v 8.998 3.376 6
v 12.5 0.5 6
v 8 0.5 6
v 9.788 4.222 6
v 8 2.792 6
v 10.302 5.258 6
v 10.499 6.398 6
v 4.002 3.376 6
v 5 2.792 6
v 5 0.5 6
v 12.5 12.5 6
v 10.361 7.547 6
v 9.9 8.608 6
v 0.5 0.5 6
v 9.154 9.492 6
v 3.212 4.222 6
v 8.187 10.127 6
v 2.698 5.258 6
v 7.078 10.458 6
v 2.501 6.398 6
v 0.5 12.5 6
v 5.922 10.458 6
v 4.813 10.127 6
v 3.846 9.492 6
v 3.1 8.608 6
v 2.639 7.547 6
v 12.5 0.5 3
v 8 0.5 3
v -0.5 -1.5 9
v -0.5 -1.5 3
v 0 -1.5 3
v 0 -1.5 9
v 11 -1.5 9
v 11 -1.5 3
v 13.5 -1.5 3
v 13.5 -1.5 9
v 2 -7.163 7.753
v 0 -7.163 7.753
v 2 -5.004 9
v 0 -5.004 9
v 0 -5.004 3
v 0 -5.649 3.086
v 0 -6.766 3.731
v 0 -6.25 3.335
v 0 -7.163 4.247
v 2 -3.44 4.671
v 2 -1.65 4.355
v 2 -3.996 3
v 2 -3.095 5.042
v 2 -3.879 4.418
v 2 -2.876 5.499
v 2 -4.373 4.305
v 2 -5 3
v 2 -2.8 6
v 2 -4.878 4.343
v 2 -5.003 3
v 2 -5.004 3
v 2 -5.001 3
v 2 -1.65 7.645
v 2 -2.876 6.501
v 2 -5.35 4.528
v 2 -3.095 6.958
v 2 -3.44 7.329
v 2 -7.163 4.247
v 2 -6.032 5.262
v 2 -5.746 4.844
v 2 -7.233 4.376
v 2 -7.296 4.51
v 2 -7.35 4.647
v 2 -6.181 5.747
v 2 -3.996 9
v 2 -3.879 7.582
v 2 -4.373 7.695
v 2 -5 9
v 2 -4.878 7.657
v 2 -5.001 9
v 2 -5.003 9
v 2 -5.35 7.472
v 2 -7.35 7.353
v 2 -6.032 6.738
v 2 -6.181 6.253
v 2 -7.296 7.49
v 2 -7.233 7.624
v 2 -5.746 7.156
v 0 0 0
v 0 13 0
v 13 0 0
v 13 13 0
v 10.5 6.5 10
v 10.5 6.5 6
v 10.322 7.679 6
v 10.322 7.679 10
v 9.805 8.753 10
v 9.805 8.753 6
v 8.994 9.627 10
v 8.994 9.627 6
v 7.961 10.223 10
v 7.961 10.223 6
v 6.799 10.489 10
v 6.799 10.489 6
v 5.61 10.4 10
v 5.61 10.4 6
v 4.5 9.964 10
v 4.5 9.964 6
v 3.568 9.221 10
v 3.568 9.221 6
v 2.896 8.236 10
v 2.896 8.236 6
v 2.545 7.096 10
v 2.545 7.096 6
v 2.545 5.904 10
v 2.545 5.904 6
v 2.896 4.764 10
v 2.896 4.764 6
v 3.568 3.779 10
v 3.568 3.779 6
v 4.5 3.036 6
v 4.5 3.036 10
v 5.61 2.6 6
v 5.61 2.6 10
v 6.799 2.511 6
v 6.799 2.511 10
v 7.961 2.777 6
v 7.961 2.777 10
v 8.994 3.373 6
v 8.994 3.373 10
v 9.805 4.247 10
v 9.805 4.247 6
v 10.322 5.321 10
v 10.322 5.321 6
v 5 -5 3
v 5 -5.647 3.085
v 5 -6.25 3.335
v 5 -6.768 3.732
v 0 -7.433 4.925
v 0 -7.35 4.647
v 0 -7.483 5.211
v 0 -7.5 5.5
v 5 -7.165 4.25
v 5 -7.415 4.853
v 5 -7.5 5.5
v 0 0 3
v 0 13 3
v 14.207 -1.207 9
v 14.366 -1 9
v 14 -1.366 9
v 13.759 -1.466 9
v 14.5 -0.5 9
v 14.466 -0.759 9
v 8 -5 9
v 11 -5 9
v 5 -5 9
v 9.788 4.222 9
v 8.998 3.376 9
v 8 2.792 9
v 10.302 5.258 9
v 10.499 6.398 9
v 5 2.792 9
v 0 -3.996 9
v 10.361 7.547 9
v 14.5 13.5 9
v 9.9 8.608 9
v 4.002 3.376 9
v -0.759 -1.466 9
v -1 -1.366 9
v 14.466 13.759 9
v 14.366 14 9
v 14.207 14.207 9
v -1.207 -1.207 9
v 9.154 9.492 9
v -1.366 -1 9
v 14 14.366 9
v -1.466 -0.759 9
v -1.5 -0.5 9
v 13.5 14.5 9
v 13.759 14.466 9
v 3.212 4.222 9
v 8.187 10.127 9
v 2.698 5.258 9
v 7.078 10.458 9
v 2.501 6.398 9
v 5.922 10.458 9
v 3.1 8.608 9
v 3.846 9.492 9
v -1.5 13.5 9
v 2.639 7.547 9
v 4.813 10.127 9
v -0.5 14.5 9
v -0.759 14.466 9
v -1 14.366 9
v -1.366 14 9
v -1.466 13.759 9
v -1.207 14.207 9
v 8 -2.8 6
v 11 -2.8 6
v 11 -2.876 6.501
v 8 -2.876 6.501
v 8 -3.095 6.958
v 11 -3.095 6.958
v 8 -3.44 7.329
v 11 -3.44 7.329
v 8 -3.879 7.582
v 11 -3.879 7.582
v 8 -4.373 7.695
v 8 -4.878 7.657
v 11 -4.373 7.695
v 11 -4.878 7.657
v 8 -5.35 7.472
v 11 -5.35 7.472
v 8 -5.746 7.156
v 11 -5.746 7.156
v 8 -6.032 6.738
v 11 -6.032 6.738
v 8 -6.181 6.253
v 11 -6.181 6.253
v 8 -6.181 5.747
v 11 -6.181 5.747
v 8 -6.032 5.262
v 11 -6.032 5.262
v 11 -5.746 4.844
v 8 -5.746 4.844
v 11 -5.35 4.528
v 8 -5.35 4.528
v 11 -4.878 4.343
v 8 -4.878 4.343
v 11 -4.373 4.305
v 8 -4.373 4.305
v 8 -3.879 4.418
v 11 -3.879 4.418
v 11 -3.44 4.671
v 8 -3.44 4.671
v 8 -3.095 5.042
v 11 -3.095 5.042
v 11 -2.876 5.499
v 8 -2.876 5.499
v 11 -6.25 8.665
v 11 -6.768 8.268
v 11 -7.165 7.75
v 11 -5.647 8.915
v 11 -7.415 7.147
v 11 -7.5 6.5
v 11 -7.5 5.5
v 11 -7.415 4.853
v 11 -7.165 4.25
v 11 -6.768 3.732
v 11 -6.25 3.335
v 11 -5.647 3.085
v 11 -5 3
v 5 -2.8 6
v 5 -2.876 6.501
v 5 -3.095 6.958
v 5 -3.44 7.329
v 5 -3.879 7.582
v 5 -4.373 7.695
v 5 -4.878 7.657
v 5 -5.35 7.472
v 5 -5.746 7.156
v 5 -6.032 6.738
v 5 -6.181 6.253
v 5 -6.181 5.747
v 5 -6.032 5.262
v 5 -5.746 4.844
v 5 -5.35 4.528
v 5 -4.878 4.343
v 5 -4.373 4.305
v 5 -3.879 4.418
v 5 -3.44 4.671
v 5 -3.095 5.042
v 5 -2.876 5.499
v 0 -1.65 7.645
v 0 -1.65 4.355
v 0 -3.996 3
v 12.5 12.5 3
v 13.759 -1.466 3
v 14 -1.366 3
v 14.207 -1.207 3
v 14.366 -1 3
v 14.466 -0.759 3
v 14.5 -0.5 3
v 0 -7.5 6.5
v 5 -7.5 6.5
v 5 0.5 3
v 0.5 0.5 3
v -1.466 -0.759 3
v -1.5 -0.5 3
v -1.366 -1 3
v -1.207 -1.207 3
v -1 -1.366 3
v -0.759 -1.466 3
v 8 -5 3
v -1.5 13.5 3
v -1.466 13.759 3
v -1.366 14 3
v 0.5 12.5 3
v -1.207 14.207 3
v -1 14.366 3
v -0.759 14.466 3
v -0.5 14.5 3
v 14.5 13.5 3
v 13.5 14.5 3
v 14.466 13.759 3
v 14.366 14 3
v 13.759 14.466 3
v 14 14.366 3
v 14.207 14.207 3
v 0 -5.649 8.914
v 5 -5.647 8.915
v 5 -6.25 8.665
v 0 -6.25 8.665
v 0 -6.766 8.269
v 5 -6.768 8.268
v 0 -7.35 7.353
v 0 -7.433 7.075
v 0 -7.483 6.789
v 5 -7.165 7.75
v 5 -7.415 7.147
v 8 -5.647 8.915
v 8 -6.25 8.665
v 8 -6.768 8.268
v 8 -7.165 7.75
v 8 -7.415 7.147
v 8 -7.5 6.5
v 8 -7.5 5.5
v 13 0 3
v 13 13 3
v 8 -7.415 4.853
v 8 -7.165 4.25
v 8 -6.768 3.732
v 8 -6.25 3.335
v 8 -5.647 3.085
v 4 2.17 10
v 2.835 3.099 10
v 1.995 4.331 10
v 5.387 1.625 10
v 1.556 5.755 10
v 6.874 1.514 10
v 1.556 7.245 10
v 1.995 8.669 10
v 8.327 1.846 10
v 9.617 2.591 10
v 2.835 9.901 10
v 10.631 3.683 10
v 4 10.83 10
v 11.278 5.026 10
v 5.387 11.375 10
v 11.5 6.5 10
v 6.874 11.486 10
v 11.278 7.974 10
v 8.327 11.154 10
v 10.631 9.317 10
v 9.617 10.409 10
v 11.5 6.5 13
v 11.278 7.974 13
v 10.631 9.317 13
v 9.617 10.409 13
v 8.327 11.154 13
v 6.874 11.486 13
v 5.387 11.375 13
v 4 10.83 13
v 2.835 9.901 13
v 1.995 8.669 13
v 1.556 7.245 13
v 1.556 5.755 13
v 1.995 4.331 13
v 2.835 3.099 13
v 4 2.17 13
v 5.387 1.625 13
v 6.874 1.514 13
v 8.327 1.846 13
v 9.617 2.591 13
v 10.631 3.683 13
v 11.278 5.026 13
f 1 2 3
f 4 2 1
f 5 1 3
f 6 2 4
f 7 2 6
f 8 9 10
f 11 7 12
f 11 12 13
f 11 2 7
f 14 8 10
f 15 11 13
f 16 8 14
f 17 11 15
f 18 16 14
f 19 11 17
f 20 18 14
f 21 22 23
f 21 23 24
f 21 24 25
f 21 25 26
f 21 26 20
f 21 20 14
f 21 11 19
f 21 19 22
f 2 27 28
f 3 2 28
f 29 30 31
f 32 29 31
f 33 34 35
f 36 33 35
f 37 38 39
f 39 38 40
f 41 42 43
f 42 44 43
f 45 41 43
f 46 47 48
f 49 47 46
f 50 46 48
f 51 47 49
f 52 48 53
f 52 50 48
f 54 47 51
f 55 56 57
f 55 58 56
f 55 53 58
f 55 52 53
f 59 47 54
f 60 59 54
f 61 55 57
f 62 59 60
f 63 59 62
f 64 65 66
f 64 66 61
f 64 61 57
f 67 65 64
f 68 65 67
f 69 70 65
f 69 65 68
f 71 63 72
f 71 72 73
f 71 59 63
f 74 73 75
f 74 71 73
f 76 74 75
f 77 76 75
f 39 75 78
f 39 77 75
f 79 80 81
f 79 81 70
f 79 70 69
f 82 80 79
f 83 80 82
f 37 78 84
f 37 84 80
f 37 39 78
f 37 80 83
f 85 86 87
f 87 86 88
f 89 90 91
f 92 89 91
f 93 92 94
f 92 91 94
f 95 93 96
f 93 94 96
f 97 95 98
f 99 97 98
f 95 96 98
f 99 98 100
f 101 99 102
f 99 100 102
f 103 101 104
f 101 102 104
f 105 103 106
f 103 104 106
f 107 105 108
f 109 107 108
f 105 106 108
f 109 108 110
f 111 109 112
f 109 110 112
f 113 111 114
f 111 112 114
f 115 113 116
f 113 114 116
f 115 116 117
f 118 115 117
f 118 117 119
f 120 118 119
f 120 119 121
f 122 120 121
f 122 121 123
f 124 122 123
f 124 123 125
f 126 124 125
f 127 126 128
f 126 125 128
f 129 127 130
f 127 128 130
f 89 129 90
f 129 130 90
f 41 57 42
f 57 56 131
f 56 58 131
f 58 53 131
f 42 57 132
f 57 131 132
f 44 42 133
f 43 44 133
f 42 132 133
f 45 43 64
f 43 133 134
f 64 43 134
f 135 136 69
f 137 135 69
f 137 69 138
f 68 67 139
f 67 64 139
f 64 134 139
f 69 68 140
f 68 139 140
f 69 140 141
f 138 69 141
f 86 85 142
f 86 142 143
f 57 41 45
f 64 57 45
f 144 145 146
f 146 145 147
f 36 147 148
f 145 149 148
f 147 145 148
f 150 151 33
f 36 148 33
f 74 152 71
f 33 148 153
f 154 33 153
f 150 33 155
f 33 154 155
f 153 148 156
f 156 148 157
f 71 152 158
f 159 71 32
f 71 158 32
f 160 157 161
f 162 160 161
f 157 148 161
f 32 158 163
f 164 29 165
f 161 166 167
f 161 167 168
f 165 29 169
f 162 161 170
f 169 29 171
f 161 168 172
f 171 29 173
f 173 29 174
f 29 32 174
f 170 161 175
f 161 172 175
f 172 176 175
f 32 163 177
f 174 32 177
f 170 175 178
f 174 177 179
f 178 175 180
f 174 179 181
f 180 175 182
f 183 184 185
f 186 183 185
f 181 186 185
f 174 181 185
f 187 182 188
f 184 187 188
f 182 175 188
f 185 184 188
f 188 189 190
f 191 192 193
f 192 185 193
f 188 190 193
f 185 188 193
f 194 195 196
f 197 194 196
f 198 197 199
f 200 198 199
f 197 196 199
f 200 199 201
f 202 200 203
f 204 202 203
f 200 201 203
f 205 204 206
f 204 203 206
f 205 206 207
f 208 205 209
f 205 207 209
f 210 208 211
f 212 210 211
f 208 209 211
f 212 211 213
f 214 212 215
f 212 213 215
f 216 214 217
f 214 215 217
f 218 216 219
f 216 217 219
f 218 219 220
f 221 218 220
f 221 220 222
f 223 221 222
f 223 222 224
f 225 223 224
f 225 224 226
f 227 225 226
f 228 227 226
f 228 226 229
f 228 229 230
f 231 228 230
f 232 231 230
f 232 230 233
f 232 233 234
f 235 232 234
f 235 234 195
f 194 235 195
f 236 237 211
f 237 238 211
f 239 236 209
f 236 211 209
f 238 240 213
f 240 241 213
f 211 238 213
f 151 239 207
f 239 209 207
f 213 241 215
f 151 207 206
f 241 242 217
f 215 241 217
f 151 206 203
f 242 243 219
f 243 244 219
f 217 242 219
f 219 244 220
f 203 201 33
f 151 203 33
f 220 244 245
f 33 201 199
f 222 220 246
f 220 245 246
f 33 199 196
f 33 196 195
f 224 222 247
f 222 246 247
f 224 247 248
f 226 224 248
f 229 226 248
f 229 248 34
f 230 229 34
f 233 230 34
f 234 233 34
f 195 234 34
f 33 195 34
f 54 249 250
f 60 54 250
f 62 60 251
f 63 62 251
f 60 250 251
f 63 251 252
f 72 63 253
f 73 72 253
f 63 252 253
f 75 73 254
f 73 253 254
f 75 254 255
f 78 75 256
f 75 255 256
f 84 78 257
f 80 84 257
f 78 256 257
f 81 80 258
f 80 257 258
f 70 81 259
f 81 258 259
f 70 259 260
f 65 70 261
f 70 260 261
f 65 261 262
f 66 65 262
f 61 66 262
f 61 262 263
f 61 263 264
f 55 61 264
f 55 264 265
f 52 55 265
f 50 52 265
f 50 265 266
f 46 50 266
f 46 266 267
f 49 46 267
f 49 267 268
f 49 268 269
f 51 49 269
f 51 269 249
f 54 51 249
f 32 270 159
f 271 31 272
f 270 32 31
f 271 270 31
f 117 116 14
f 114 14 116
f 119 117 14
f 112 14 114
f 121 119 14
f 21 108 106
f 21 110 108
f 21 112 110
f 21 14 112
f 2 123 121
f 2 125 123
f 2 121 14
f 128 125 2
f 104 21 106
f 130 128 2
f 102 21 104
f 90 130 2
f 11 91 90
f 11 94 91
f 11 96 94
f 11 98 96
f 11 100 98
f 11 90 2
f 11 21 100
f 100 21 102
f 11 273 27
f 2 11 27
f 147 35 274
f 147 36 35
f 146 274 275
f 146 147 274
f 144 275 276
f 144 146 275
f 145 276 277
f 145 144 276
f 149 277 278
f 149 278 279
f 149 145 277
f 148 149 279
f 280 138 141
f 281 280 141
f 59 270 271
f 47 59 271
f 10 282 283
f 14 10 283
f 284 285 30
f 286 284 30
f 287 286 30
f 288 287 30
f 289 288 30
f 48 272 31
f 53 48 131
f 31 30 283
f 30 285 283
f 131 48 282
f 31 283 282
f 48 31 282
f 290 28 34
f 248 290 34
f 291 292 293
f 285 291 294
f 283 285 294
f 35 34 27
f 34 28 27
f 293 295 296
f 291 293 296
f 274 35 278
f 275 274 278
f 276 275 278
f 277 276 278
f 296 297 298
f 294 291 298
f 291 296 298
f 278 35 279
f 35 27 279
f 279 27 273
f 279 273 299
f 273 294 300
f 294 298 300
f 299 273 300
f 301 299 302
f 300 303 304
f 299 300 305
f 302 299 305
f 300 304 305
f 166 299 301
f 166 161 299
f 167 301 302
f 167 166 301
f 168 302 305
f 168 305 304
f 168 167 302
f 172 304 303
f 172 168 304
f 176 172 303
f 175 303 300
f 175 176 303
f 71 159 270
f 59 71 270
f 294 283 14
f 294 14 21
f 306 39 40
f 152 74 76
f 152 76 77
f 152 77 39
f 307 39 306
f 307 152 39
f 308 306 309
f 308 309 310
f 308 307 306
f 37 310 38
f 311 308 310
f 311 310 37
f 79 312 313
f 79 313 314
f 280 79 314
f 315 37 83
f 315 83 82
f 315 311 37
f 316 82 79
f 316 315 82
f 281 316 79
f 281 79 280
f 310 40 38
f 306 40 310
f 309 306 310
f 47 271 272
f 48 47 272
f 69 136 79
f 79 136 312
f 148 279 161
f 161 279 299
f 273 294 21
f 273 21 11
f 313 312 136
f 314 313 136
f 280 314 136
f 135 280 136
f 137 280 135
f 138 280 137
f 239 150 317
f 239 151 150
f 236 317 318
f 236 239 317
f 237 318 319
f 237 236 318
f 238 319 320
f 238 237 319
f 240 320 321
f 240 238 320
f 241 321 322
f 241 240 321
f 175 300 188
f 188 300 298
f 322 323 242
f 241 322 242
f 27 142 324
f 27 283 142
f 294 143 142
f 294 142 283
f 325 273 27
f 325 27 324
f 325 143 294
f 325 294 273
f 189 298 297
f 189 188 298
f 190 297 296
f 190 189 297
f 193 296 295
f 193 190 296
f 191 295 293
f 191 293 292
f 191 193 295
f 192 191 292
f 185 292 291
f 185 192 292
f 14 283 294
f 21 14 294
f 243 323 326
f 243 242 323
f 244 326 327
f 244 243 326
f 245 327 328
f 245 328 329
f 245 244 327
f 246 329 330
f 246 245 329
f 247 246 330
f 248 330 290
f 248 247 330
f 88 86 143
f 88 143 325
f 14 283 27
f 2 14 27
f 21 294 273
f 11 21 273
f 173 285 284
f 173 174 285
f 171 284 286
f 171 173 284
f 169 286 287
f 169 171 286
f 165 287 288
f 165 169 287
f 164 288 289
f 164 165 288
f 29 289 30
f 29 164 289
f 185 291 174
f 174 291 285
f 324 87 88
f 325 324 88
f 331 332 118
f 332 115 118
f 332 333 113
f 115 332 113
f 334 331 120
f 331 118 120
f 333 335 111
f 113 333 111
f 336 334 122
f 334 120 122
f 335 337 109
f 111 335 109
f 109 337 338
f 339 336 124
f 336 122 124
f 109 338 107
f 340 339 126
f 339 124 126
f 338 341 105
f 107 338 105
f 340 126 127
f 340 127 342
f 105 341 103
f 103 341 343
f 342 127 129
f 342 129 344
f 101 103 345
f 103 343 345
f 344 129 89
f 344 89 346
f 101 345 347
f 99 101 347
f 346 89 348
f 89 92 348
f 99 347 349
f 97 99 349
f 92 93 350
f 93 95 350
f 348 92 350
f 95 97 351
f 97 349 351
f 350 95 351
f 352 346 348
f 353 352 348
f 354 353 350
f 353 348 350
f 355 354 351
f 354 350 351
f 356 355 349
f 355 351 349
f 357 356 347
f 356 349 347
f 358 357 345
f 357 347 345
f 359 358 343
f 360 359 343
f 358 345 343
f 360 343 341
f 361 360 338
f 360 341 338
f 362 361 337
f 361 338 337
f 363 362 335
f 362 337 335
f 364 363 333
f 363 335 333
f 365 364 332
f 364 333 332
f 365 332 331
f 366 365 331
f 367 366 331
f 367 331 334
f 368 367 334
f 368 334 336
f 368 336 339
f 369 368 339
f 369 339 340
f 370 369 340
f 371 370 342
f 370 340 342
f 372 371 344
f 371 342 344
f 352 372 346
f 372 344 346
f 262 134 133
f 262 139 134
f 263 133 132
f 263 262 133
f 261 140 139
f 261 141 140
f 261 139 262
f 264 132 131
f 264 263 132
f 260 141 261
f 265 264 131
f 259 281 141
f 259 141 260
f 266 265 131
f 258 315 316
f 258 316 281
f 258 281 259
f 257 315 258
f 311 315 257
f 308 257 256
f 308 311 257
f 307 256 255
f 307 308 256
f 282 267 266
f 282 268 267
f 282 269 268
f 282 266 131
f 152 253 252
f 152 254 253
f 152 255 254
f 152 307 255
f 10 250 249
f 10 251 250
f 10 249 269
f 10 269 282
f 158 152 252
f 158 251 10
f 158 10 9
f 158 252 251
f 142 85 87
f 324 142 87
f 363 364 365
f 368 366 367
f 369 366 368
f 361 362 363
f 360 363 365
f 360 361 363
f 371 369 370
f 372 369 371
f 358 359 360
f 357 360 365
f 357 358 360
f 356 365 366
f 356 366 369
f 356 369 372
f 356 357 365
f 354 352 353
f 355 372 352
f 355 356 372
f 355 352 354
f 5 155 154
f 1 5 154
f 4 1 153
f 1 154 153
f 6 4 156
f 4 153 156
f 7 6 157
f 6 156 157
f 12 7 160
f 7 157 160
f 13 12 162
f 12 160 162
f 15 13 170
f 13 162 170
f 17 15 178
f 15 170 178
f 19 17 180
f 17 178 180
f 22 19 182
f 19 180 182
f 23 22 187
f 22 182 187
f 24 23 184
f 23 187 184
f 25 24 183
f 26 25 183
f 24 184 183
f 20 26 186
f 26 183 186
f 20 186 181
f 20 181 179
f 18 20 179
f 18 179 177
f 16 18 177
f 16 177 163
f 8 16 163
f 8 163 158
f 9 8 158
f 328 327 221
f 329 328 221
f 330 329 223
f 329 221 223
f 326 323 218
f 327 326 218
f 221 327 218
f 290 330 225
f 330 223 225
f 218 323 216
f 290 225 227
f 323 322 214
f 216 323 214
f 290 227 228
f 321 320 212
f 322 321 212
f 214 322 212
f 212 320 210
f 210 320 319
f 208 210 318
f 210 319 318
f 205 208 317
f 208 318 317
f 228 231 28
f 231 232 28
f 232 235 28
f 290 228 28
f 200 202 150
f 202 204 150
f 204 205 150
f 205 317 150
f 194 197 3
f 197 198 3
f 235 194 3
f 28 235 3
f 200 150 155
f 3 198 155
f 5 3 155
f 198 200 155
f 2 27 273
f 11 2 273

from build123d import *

# Parameters (mm, degrees)
BOX_W           = 13
BOX_H           = 13
BOX_DEPTH       = 3
SKETCH_W        = 12
SKETCH_H        = 12
PAD_DEPTH       = 3
SKETCH001_R     = 4
PAD001_DEPTH    = 4
SKETCH002_R     = 5
PAD002_DEPTH    = 3
PAD003_DEPTH    = 6
PAD004_DEPTH    = 3
SKETCH005_R     = 1.7
POCKET_DEPTH    = 15
FILLET_R        = 2.5
POCKET001_DEPTH = 2
FILLET001_R     = 1


with BuildPart() as camera:
    # Box → Box (new body)
    with BuildSketch(Plane.XY):
        with Locations((6.5, 6.5)):
            Rectangle(BOX_W, BOX_H)
    extrude(amount=BOX_DEPTH)

    # Sketch → Pad (new body)
    with BuildSketch(Plane.XY.offset(3)):
        with Locations((6.5, 6.5)):
            Rectangle(SKETCH_W, SKETCH_H)
    extrude(amount=PAD_DEPTH)

    # Sketch001 → Pad001 (new body)
    with BuildSketch(Plane.XY.offset(6)):
        with Locations((6.5, 6.5)):
            Circle(SKETCH001_R)
    extrude(amount=PAD001_DEPTH)

    # Sketch002 → Pad002 (new body)
    with BuildSketch(Plane.XY.offset(10)):
        with Locations((6.5, 6.5)):
            Circle(SKETCH002_R)
    extrude(amount=PAD002_DEPTH)


with BuildPart() as cam_holder:
    # Sketch003 → Pad003 (new body)
    with BuildSketch(Plane.XY.offset(3)):
        Polygon((0.5, 12.5), (12.5, 12.5), (12.5, 0.5), (8, 0.5), (8, -7.5), (11, -7.5), (11, -1.5), (14.5, -1.5), (14.5, 14.5), (-1.5, 14.5), (-1.5, -1.5), (0, -1.5), (0, -7.5), (5, -7.5), (5, 0.5), (0.5, 0.5), align=None)
    extrude(amount=PAD003_DEPTH)

    # Sketch004 → Pad004 (new body)
    with BuildSketch(Plane.XY.offset(9)):
        with BuildLine():
            ThreePointArc((8, 2.791901), (6.5, 10.5), (5, 2.791901))
            Line((5, 0.5), (5, 2.791901))
            Line((5, 0.5), (0.5, 0.5))
            Line((0.5, 0.5), (0.5, 12.5))
            Line((0.5, 12.5), (12.5, 12.5))
            Line((12.5, 12.5), (12.5, 0.5))
            Line((12.5, 0.5), (8, 0.5))
            Line((8, 0.5), (8, 2.791901))
        make_face()
    extrude(amount=-PAD004_DEPTH)

    # Sketch005 → Pocket (cut)
    with BuildSketch(Plane(origin=(11, 0, 3), x_dir=(0, 1, 0), z_dir=(1, 0, 0))):
        with Locations((-4.5, 3)):
            Circle(SKETCH005_R)
    extrude(amount=-POCKET_DEPTH, mode=Mode.SUBTRACT)

    # Fillet
    fillet_edges = [cam_holder.edges().sort_by_distance(p)[0] for p in [
        (2.5, -7.5, 9),
        (2.5, -7.5, 3),
        (9.5, -7.5, 3),
        (9.5, -7.5, 9),
    ]]
    fillet(fillet_edges, radius=FILLET_R)

    # Sketch006 → Pocket001 (cut)
    with BuildSketch(Plane(origin=(0, 0, 3), x_dir=(0, -1, 0), z_dir=(-1, 0, 0))):
        Polygon((7.35, 4.645448), (4.5, 6.290897), (1.65, 4.645448), (1.65, 1.354552), (4.5, -0.290897), (7.35, 1.354552), align=None)
    extrude(amount=-POCKET001_DEPTH, mode=Mode.SUBTRACT)

    # Fillet001
    fillet001_edges = [cam_holder.edges().sort_by_distance(p)[0] for p in [
        (-1.5, 14.5, 6),
        (14.5, -1.5, 6),
        (14.5, 14.5, 6),
        (-1.5, -1.5, 6),
    ]]
    fillet(fillet001_edges, radius=FILLET001_R)


solid = Compound([camera.part, cam_holder.part])
